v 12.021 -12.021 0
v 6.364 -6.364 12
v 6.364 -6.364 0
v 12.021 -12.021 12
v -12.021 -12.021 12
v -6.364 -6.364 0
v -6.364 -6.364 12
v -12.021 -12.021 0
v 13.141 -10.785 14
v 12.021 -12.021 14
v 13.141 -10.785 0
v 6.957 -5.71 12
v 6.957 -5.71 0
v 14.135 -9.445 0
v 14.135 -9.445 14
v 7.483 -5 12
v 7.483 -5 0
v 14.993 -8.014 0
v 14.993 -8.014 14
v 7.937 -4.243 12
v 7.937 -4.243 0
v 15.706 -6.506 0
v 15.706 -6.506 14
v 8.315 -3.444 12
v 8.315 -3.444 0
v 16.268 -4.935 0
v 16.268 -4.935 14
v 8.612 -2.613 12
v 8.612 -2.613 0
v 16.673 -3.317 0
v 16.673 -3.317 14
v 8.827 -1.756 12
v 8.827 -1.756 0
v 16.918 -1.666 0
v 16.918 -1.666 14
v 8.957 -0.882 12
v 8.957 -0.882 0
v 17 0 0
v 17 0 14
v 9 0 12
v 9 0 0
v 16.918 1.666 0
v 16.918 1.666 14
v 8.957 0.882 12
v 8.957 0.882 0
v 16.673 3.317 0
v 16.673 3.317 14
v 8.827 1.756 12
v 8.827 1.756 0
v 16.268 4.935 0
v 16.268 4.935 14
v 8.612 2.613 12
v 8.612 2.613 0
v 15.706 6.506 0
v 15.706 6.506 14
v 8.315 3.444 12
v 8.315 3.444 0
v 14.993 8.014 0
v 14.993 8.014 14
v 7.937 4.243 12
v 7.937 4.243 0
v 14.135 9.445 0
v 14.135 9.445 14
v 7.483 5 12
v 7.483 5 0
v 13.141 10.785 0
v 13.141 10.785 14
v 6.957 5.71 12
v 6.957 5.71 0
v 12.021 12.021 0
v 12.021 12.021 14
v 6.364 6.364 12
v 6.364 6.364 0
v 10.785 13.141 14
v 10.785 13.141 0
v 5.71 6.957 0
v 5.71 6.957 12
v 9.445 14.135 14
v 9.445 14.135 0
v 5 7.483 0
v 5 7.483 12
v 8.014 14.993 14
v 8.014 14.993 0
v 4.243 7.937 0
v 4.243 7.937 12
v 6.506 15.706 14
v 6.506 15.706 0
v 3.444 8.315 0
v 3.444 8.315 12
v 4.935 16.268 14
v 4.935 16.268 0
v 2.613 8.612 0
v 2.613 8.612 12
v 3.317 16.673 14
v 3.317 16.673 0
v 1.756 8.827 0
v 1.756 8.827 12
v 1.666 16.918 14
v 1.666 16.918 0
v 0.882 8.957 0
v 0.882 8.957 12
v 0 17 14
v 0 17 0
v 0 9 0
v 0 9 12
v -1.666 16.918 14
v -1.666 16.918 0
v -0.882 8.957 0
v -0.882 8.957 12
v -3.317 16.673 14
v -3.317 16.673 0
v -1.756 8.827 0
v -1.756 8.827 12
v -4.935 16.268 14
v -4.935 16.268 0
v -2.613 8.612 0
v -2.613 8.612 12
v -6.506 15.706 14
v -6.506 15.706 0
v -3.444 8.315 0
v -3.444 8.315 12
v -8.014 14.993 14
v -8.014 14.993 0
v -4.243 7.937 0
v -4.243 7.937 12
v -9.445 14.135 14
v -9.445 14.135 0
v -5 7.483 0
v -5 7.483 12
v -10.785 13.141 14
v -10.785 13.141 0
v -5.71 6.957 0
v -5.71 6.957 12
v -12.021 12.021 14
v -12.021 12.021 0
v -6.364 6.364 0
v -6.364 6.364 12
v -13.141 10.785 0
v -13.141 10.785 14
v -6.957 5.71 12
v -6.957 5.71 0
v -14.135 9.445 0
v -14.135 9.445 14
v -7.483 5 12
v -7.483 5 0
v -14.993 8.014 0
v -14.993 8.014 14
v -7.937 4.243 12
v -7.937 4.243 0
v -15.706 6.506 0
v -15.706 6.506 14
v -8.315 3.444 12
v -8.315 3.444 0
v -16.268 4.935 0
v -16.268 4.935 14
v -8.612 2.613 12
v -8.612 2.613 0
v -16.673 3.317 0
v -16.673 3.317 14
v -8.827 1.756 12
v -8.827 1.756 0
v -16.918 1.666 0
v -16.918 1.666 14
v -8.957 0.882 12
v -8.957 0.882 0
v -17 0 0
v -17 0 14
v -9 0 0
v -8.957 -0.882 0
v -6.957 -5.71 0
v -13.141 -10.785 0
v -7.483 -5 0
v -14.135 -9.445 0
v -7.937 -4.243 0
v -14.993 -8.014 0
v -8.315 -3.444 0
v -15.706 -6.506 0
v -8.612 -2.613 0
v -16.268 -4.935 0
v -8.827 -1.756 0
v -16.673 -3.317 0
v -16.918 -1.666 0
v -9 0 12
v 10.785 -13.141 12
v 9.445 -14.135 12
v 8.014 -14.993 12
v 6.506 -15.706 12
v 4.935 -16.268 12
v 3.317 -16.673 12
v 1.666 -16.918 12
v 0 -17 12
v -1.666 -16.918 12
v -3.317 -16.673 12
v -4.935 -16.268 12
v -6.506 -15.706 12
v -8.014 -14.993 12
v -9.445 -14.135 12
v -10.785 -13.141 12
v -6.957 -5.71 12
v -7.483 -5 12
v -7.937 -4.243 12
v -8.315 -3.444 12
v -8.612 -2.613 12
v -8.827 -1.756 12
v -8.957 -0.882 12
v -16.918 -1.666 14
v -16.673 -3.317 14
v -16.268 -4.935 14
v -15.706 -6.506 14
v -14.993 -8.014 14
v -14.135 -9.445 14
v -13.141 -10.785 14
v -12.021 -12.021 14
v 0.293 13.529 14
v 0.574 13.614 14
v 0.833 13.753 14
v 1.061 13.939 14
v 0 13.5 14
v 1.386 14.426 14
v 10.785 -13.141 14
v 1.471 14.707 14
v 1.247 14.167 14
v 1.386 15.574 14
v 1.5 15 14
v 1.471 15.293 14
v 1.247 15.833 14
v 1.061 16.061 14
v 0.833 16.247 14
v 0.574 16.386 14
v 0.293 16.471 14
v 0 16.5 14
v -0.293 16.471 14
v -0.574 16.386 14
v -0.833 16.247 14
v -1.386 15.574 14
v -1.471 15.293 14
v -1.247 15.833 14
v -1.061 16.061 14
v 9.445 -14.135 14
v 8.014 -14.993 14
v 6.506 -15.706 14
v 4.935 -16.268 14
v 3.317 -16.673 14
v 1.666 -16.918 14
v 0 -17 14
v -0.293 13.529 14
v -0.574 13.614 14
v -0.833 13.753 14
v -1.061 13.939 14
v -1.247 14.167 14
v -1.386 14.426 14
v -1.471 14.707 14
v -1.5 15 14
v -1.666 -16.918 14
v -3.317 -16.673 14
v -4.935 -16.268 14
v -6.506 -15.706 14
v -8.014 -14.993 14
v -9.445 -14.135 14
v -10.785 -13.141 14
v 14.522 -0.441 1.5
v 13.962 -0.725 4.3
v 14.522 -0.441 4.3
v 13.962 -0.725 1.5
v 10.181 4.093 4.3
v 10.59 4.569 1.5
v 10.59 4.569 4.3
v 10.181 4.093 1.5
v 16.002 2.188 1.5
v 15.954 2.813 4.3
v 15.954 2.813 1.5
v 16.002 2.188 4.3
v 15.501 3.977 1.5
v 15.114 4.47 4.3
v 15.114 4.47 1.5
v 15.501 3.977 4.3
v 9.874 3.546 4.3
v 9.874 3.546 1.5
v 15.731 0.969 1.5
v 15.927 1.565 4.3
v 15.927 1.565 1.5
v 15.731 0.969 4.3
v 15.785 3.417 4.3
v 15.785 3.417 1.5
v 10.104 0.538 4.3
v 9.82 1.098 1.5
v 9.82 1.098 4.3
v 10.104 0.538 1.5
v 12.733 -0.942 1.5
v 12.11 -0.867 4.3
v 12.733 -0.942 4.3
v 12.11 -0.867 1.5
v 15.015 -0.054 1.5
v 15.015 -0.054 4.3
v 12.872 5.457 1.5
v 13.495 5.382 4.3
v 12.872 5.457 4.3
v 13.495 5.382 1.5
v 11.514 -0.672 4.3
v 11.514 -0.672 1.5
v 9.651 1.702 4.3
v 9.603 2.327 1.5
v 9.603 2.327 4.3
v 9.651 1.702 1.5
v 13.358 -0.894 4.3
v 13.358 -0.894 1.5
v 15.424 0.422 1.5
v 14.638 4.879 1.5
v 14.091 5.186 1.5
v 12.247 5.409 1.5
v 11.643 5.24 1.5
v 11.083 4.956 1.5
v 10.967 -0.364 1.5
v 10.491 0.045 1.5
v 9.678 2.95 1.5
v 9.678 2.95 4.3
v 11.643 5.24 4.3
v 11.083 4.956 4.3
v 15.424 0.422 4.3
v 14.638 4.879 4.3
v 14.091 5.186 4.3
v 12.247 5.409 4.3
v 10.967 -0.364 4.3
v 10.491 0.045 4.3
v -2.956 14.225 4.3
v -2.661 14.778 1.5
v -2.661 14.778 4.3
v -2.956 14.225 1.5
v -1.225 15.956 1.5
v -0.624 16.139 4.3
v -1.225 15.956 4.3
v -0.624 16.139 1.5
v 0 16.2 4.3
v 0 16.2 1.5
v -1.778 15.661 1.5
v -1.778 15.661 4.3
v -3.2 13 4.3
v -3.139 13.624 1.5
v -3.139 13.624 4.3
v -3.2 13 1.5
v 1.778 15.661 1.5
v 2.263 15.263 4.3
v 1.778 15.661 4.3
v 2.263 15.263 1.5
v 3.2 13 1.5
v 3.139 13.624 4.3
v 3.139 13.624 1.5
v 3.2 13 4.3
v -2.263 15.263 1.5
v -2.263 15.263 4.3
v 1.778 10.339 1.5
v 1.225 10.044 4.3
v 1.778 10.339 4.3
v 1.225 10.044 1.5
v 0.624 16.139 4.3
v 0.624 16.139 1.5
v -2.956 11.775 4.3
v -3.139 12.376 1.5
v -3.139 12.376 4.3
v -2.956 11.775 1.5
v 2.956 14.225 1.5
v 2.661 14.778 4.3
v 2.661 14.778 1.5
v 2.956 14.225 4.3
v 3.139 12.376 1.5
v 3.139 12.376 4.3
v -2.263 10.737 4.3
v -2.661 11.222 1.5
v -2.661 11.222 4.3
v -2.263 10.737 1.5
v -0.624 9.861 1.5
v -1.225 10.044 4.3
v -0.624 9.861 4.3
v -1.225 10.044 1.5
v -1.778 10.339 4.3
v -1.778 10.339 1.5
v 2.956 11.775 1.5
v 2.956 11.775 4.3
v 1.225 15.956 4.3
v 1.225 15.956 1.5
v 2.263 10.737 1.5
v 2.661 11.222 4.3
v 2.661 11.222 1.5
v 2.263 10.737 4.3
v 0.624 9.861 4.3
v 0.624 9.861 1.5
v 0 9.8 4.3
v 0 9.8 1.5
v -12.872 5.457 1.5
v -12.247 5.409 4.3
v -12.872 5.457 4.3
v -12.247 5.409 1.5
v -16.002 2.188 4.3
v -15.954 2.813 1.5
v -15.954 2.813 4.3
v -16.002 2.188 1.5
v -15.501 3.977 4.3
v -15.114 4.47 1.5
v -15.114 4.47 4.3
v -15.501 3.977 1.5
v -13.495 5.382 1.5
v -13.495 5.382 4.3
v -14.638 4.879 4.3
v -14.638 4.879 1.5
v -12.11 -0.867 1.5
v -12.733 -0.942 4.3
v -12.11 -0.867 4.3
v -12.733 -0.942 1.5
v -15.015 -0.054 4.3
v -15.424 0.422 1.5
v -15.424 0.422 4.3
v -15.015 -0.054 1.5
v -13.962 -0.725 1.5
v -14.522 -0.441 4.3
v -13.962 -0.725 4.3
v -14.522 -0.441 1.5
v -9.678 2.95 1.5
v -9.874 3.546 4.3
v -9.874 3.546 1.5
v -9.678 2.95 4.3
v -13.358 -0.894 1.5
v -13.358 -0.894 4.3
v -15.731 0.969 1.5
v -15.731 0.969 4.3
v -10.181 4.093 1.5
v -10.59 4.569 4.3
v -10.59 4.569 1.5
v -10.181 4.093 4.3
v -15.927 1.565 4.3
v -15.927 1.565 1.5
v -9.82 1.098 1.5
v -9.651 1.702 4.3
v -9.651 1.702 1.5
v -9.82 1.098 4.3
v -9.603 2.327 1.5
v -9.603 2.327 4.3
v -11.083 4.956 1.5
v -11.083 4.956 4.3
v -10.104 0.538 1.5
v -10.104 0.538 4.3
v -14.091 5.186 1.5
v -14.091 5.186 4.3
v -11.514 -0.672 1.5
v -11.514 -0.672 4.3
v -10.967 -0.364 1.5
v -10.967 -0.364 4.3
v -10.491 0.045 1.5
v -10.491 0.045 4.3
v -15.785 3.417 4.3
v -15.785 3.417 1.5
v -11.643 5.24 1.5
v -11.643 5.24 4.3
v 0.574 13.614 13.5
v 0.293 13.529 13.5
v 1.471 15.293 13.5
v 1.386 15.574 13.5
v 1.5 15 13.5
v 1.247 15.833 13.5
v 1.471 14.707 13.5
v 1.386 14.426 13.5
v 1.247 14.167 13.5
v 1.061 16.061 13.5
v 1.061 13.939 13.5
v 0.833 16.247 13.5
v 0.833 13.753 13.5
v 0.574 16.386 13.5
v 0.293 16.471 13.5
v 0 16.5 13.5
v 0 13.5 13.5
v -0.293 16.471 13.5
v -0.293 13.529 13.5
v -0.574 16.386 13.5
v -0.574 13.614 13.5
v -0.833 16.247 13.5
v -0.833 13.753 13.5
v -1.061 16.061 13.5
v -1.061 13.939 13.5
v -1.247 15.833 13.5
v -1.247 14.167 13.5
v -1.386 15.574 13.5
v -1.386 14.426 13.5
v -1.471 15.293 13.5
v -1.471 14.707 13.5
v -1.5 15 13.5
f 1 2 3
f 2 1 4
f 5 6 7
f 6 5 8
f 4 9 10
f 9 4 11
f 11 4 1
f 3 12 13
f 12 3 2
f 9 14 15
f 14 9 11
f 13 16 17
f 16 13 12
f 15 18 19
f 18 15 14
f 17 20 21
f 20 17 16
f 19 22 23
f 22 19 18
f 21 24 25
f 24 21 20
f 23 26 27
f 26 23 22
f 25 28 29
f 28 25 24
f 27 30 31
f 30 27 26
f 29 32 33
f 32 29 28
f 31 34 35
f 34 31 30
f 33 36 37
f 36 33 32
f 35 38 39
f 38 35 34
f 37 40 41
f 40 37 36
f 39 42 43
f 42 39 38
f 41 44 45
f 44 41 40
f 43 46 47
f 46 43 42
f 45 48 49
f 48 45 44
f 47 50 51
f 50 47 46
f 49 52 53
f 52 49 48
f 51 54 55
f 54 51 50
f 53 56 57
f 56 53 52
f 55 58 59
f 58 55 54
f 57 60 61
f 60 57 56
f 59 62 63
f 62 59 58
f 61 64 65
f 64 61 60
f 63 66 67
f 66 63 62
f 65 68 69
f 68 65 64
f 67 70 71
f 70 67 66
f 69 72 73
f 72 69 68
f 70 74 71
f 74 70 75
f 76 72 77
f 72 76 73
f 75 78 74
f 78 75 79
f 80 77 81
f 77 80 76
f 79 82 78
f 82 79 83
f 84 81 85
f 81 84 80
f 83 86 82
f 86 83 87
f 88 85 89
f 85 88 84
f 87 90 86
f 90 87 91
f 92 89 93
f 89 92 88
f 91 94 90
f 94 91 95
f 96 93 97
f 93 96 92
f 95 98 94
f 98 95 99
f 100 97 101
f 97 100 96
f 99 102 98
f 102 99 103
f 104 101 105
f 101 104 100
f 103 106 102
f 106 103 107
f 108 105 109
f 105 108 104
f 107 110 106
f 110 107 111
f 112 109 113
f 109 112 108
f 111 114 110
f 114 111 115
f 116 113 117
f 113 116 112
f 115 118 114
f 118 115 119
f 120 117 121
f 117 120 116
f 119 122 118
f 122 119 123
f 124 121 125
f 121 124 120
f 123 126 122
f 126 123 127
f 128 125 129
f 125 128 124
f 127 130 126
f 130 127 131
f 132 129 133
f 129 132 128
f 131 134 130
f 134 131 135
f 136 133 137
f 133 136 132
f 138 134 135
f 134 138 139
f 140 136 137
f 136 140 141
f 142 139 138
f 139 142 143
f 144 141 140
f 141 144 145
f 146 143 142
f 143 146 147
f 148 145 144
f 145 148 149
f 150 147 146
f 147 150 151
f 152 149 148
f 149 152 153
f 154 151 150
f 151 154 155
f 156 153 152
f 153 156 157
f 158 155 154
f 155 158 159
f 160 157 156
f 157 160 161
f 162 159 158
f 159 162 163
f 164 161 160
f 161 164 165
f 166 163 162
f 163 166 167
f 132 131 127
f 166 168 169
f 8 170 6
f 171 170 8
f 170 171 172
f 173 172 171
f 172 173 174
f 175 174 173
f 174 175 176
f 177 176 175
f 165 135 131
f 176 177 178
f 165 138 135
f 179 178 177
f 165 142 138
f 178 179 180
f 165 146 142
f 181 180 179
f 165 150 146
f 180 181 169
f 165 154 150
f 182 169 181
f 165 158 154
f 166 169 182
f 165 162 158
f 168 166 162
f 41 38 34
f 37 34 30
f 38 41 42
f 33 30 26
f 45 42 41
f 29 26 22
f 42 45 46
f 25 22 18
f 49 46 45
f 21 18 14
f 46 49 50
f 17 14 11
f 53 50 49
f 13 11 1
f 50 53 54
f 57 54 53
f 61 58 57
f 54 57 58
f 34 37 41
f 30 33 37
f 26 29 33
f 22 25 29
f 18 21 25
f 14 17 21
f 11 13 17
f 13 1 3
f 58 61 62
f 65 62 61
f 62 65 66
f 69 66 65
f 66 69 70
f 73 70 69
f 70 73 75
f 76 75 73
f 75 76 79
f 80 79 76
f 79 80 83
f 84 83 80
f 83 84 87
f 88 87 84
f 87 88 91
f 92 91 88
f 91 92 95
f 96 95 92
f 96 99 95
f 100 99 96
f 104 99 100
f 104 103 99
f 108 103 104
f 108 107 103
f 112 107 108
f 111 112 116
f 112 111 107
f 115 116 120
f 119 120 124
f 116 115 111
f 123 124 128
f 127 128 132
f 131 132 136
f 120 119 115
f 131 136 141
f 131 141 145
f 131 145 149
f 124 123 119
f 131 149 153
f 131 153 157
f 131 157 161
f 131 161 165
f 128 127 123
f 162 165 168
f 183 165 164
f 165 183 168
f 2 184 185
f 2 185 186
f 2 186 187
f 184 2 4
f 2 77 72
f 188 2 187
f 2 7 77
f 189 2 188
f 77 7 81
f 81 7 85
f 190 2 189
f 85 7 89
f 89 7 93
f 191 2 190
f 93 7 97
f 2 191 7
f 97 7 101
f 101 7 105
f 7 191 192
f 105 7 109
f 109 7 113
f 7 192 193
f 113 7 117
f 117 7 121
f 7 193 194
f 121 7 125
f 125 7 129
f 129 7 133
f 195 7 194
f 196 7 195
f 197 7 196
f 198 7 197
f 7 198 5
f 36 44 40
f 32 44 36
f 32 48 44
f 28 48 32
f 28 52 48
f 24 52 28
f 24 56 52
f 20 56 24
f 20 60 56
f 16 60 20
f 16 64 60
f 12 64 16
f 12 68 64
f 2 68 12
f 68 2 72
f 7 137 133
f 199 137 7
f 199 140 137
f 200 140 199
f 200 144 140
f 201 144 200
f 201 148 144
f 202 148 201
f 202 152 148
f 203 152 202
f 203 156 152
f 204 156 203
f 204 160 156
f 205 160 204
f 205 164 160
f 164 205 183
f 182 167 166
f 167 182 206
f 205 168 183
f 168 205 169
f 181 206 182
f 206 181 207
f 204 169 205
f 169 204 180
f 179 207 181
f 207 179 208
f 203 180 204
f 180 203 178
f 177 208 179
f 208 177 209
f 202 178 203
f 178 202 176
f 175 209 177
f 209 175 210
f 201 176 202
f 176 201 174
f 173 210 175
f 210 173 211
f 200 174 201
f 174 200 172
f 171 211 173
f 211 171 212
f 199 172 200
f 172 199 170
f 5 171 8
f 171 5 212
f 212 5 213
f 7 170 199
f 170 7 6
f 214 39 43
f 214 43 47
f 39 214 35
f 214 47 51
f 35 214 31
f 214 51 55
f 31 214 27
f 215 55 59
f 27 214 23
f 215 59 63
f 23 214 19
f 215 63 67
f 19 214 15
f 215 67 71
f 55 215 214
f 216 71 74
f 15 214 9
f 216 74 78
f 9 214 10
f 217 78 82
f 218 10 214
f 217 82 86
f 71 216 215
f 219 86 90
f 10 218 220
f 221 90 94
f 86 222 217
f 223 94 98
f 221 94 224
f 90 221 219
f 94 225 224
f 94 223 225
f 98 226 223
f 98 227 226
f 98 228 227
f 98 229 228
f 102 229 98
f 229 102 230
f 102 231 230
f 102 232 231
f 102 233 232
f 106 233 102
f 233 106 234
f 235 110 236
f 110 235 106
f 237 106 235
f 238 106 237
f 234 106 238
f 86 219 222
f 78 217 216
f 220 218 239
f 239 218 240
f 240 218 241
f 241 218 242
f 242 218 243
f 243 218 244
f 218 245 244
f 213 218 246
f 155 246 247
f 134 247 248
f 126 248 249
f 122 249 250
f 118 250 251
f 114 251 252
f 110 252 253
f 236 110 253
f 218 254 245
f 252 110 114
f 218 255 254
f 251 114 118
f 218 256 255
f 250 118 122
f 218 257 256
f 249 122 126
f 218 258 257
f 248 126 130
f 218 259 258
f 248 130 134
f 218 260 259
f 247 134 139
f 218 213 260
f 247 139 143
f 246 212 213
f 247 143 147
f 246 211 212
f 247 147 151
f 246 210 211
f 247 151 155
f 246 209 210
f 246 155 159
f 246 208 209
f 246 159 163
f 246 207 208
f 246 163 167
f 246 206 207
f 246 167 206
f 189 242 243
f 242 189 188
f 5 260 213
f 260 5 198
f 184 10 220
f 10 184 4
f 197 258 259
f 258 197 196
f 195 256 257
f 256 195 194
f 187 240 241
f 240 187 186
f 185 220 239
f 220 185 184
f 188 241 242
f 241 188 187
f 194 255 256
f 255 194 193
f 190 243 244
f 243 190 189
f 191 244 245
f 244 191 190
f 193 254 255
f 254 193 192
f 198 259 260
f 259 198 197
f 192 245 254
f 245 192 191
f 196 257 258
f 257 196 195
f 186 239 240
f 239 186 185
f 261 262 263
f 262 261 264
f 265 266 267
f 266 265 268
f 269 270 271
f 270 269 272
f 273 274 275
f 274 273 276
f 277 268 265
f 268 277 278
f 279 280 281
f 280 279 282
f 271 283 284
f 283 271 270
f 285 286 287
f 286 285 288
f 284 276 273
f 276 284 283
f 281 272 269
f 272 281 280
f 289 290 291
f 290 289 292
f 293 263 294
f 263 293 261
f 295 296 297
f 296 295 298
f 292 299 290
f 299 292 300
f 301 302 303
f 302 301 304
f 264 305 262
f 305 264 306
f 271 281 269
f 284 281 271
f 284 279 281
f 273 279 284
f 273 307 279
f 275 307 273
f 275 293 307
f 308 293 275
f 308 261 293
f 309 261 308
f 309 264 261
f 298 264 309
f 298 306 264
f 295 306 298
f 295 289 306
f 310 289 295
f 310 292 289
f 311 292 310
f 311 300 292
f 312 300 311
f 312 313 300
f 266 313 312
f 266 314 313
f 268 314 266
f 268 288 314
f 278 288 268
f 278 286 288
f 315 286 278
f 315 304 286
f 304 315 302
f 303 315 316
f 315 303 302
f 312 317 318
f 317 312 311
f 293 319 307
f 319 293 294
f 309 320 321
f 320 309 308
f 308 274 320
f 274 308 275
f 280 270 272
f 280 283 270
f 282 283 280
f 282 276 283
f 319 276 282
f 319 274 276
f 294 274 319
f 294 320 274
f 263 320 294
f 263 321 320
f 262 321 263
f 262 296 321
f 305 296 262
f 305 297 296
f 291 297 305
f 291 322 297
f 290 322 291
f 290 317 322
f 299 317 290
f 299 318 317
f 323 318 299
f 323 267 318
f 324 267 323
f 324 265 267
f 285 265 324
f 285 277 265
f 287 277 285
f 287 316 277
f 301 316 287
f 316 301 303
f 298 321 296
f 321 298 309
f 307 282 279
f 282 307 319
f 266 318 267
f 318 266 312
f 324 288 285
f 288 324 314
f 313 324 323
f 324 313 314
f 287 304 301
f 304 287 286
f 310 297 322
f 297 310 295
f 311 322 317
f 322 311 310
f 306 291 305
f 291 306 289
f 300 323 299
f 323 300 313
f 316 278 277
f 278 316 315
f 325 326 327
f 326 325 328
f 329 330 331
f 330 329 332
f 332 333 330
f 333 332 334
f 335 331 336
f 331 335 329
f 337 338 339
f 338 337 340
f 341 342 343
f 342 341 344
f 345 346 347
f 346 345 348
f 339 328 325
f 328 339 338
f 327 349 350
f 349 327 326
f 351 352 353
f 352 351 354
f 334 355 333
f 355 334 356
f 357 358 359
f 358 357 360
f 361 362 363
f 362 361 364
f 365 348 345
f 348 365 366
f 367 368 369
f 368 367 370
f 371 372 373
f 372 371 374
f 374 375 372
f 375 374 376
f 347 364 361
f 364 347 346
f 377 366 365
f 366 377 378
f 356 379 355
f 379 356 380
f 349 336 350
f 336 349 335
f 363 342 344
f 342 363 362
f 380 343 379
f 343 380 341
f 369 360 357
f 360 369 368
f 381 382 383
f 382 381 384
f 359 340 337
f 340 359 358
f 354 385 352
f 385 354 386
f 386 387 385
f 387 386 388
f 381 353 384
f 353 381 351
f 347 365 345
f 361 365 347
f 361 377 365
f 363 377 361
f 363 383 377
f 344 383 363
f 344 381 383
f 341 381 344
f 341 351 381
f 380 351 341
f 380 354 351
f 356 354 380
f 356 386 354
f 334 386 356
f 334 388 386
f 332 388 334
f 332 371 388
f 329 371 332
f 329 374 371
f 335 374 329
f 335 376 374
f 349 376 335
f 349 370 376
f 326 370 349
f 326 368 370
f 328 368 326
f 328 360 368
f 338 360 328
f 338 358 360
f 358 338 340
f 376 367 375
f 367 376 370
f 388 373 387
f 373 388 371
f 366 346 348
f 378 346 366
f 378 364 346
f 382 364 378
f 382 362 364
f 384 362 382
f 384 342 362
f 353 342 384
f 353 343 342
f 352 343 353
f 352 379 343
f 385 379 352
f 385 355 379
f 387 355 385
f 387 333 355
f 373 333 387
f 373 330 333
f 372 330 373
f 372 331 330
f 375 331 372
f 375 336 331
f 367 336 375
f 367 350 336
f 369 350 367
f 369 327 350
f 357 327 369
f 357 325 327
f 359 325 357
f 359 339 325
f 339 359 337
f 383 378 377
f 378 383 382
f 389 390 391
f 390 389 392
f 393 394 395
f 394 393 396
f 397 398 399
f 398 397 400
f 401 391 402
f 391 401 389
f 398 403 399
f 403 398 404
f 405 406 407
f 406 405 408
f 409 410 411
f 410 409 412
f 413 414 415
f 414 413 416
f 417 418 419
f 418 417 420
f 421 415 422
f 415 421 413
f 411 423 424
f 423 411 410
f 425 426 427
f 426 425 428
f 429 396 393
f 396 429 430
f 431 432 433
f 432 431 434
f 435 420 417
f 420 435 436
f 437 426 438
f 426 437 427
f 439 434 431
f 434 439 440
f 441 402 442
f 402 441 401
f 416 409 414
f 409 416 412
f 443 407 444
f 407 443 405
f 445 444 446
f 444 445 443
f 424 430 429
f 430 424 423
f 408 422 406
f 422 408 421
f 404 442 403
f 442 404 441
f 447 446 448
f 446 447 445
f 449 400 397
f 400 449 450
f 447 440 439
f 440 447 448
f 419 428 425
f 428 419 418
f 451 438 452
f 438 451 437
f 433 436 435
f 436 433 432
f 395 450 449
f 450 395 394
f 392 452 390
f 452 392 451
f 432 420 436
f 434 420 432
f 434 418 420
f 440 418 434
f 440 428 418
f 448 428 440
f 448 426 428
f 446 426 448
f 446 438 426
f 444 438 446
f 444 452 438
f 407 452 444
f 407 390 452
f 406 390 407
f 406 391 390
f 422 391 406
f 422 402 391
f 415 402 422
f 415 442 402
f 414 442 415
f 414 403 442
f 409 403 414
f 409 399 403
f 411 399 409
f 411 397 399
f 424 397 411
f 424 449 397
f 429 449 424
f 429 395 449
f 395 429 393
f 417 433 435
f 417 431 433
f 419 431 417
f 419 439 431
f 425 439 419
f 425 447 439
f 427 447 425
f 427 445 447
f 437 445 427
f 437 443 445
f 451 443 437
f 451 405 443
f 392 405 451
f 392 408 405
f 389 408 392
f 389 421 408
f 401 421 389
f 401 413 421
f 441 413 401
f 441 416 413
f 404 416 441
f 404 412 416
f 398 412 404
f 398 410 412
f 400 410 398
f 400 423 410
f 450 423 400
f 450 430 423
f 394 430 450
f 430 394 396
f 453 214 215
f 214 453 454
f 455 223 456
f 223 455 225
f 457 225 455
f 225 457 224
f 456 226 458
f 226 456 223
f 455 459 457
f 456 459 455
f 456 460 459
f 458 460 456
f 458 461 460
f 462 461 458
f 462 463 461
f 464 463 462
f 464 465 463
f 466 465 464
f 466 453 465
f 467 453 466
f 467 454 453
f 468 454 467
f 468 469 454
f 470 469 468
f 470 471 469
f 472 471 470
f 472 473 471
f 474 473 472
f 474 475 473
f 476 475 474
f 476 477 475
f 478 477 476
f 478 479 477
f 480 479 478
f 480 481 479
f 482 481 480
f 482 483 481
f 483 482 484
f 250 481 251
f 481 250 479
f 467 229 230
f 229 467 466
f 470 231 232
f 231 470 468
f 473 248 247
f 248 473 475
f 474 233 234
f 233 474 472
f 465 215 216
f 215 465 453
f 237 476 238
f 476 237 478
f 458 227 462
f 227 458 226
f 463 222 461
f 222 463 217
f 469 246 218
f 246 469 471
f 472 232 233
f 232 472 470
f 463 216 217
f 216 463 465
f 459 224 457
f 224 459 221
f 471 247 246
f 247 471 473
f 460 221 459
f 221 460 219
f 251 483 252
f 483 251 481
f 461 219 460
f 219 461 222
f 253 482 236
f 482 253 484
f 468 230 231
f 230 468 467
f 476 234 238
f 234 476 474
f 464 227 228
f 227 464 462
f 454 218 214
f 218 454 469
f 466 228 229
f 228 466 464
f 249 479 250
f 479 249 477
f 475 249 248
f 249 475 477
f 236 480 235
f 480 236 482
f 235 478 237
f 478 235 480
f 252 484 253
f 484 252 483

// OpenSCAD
// Dishwasher Button Cover
// Horseshoe-shaped ring with closed top, held by 3 embedded magnets.
// Gap faces -Y (front). Inner radius 9mm, outer radius 17mm.

inner_r        = 9;    // inner radius of ring
outer_r        = 17;   // outer radius of ring
ring_h         = 12;   // height of ring walls
cover_t        = 2;    // top cover plate thickness
opening_angle  = 90;   // gap angle for the horseshoe opening
cover_angle    = 360;  // top cover sweep: 360 = full circle, use arc_angle to match horseshoe

tdc_clock      = 12;   // clock position of TDC mark (1–12); 12 = top, 3 = right
tdc_depth      = 0.5;    // depth of TDC dimple
tdc_d          = 3;    // diameter of TDC dimple
tdc_inset      = 2;    // distance from outer edge to dimple centre

magnet_d       = 6;    // magnet diameter
magnet_depth   = 2.7;  // magnet pocket depth
magnet_fit     = 0.2;  // radial clearance
magnet_floor   = 1.5;  // solid floor below each pocket (pause-and-place layer)
magnet_spacing = 80;   // degrees between adjacent magnets

$fn = 64;

wall_t      = outer_r - inner_r;   // 8 mm wall
arc_angle   = 360 - opening_angle; // 270° solid arc
// Gap centred at 270° (-Y). Arc starts at 315° and sweeps 270° CCW.
start_angle = 270 + opening_angle / 2;

// 3 magnets centred on the arc midpoint, separated by magnet_spacing degrees
arc_mid = start_angle + arc_angle / 2;
m1 = arc_mid - magnet_spacing;
m2 = arc_mid;
m3 = arc_mid + magnet_spacing;

// --- Ring walls (horseshoe arc) ---
module horseshoe_walls() {
    rotate([0, 0, start_angle])
    rotate_extrude(angle = arc_angle, $fn = $fn)
        translate([inner_r, 0])
            square([wall_t, ring_h]);
}

// --- Top cover plate ---
module top_cover() {
    translate([0, 0, ring_h])
    rotate_extrude(angle = cover_angle, $fn = $fn)
        square([outer_r, cover_t]);
}

// --- Vertical magnet pocket with solid floor ---
// Opens from z = magnet_floor upward; printer pauses at that layer to insert magnets.
module magnet_pocket(angle) {
    wall_centre_r = (inner_r + outer_r) / 2;
    rotate([0, 0, angle])
    translate([wall_centre_r, 0, magnet_floor])
    cylinder(d = magnet_d + magnet_fit * 2, h = magnet_depth + 0.1, $fn = 32);
}

// --- TDC orientation dimple on top face ---
// Clock angle: 12 o'clock = 90°, 3 = 0°, 6 = 270°, 9 = 180°
module tdc_mark() {
    tdc_angle = 90 - tdc_clock * 30;
    tdc_r     = outer_r - tdc_inset;
    translate([cos(tdc_angle) * tdc_r, sin(tdc_angle) * tdc_r,
               ring_h + cover_t - tdc_depth])
    cylinder(d = tdc_d, h = tdc_depth + 0.1, $fn = 32);
}

// --- Final part ---
module button_cover() {
    difference() {
        union() {
            horseshoe_walls();
            top_cover();
        }
        magnet_pocket(m1);
        magnet_pocket(m2);
        magnet_pocket(m3);
        tdc_mark();
    }
}

button_cover();
